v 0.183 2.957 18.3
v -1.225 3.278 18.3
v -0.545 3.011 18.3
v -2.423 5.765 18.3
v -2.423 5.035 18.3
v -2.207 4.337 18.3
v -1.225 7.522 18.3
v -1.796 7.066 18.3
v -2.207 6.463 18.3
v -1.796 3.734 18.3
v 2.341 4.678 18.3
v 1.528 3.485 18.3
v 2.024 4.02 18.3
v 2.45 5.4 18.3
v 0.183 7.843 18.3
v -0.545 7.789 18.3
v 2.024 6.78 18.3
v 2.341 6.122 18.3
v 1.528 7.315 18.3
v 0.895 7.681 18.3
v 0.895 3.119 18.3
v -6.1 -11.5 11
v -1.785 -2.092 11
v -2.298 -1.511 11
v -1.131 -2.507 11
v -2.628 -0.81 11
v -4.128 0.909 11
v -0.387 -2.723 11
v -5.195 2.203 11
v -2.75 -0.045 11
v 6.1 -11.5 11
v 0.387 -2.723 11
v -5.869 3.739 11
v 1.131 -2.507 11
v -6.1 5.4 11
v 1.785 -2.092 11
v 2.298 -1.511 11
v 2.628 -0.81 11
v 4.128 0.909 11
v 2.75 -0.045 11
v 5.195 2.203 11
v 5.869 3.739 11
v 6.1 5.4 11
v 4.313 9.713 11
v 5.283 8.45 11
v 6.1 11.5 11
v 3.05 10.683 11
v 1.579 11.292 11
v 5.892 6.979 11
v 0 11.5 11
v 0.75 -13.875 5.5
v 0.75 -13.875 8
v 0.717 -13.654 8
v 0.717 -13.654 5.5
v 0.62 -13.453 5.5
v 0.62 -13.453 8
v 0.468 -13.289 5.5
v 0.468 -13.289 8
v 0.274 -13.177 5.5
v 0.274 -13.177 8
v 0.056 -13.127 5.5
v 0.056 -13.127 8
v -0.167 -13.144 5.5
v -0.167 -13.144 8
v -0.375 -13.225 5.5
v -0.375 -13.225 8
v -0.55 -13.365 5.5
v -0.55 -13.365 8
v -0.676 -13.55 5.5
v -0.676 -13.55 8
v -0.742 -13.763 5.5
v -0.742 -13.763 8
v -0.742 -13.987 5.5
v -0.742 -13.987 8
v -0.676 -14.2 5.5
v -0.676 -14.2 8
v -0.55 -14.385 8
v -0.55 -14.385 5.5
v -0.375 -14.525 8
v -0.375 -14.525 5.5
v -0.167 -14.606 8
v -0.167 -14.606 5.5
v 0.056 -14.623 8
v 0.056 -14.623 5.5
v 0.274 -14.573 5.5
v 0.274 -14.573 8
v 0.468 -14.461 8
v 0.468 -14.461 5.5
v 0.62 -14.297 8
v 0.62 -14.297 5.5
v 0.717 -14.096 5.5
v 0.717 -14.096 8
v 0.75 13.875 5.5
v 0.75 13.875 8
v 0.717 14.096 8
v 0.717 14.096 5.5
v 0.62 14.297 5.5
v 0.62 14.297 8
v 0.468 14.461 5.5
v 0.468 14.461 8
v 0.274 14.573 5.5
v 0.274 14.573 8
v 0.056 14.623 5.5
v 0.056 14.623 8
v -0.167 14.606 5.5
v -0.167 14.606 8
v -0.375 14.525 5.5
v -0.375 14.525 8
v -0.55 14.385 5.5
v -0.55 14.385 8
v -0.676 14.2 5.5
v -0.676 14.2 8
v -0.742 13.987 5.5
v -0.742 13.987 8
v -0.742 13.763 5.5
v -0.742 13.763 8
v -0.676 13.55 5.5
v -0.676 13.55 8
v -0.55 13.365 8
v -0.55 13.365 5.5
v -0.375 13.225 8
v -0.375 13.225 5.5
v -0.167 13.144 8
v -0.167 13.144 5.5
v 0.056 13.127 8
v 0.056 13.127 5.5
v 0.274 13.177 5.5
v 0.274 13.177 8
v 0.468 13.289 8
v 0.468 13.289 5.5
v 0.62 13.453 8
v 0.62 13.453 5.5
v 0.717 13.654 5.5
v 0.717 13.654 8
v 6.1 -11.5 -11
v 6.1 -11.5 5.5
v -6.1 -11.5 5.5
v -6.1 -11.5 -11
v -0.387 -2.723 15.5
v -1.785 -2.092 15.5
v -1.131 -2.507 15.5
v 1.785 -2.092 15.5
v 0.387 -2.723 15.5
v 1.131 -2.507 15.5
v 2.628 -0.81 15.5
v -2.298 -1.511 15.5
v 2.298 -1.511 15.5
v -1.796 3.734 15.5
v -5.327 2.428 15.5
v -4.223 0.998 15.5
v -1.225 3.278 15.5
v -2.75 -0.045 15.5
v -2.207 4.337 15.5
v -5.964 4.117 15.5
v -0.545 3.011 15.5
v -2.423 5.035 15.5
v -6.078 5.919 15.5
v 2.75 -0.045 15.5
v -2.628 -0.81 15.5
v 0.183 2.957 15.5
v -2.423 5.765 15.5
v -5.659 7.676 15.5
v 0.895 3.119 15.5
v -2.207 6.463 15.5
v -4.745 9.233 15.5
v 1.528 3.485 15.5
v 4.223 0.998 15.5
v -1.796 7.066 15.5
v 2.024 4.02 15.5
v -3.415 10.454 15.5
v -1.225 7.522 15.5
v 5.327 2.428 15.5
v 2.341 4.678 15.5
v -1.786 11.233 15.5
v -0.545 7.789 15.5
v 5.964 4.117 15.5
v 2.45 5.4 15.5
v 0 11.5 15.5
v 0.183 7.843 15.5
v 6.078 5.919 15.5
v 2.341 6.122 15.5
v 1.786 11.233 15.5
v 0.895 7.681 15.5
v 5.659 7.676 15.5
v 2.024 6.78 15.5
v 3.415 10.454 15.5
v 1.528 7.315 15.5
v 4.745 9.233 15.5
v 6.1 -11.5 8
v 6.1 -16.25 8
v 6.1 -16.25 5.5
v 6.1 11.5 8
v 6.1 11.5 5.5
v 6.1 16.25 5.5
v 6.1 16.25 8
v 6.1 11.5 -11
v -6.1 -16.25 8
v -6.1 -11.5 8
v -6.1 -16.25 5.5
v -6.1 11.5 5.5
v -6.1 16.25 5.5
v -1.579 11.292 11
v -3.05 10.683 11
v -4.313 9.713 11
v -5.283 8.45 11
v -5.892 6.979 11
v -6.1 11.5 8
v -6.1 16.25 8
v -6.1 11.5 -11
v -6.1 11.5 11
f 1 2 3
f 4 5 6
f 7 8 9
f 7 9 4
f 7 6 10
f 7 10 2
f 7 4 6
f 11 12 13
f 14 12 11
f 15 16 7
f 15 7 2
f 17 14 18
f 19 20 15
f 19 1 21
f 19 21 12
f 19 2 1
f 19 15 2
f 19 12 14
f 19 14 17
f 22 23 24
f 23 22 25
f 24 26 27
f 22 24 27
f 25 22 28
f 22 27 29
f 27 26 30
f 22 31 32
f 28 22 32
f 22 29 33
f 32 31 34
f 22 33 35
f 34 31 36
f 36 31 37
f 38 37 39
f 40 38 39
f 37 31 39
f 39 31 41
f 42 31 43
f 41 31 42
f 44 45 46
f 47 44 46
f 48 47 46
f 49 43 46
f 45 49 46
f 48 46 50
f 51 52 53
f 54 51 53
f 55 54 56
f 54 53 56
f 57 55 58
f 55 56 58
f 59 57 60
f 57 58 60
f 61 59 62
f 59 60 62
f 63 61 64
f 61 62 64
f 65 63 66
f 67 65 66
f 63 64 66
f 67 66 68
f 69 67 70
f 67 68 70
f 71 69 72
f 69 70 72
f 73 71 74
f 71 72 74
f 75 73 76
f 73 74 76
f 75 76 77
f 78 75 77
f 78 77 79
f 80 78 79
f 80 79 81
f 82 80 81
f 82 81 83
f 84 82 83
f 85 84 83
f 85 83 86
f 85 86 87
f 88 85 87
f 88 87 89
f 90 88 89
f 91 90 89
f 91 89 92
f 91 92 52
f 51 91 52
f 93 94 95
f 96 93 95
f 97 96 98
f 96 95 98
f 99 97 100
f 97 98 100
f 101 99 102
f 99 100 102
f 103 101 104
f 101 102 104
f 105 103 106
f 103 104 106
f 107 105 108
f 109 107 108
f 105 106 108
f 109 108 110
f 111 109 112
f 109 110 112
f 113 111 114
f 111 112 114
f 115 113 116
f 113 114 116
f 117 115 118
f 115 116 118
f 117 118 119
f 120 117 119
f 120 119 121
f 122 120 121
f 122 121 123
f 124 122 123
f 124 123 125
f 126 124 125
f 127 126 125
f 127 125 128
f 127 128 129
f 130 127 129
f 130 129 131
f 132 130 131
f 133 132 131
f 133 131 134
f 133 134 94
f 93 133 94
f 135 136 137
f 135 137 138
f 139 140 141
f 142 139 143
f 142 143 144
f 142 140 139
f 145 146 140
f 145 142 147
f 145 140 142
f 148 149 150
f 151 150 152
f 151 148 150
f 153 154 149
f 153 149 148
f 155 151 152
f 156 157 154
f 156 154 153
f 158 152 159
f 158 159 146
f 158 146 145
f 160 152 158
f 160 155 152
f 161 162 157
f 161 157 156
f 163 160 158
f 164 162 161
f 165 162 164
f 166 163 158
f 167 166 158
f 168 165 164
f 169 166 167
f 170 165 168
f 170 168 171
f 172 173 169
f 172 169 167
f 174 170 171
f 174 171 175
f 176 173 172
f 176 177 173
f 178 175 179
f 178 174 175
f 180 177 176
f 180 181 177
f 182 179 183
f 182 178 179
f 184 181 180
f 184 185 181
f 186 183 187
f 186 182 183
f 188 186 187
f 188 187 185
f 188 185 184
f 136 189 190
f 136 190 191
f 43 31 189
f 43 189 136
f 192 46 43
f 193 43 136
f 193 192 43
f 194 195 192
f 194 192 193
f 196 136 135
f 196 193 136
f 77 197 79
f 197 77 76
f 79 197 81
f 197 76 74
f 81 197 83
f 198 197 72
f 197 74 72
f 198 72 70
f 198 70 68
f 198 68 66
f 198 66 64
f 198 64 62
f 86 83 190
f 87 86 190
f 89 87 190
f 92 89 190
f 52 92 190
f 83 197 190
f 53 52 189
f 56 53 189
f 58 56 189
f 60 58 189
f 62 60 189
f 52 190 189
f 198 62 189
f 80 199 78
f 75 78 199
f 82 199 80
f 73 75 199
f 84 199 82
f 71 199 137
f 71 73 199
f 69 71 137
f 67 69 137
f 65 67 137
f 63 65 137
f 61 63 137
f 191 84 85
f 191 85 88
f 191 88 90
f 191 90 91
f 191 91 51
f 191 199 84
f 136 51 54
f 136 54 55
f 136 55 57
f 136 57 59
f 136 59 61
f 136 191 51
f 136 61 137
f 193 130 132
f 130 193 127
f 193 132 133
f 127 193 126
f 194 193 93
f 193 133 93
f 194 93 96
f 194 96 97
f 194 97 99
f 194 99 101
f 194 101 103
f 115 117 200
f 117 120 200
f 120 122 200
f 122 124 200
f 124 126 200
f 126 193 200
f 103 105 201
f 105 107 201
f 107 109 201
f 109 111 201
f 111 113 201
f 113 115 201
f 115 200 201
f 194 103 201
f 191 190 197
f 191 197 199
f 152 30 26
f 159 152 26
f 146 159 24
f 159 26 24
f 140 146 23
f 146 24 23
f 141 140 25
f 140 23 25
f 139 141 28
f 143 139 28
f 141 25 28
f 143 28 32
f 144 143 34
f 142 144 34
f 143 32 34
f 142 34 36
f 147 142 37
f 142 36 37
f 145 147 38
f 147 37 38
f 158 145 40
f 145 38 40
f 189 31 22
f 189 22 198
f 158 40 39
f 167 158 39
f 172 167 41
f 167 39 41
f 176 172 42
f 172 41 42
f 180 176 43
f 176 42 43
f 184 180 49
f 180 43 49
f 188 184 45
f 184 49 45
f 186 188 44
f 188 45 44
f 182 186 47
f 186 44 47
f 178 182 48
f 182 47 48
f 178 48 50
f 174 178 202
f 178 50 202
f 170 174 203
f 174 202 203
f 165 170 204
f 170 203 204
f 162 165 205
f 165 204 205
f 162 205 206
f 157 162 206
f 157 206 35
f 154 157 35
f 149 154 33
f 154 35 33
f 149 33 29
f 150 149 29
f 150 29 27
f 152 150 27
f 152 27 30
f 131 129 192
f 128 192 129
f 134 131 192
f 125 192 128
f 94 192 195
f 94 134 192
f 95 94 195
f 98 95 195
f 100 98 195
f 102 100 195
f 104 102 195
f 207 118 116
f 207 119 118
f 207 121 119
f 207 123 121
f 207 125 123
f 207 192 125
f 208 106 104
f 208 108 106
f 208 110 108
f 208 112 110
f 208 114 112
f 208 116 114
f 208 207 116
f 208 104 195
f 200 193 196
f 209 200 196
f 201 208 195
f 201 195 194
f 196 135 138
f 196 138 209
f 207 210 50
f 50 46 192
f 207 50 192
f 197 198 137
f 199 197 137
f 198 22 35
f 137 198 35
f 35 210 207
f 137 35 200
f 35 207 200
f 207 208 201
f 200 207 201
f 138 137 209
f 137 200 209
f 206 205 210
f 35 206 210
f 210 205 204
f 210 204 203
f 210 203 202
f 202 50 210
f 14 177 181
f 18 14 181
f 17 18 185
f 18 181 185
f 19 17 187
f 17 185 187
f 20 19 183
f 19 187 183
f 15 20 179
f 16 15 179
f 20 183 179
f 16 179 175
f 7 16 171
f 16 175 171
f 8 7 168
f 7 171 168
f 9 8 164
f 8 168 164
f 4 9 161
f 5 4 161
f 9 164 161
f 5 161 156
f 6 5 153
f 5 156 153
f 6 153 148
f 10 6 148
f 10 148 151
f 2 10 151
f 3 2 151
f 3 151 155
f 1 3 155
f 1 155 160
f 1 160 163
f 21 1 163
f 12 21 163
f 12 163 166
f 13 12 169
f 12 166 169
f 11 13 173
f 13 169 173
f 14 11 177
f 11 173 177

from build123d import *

# Parameters (mm, degrees)
ESQUISSE1_W             = 22
ESQUISSE1_H             = 23
BOSS_EXTRU_1_DEPTH      = 6.1
BOSS_EXTRU_2_DEPTH      = 4.5
ESQUISSE3_R             = 2.45
BOSS_EXTRU_3_DEPTH      = 2.8
ESQUISSE4_W             = 2.5
ESQUISSE4_H             = 4.75
BOSS_EXTRU_4_DEPTH      = 6.1
ENL_V_MAT_EXTRU_1_REACH = 21
ESQUISSE5_R             = 0.75


with BuildPart() as part:
    # Esquisse1 → Boss.-Extru.1 (new body, symmetric)
    with BuildSketch(Plane(origin=(0, 0, 0), x_dir=(0, 0, -1), z_dir=(1, 0, 0))):
        Rectangle(ESQUISSE1_W, ESQUISSE1_H)
    extrude(amount=BOSS_EXTRU_1_DEPTH, both=True)

    # Esquisse2 → Boss.-Extru.2 (add)
    with BuildSketch(Plane.XY.offset(11)):
        with BuildLine():
            ThreePointArc((2.749629517, -0.045138889), (0, 11.5), (-2.749629517, -0.045138889))
            ThreePointArc((-2.749629517, -0.045138889), (0, -2.75), (2.749629517, -0.045138889))
        make_face()
    extrude(amount=BOSS_EXTRU_2_DEPTH)

    # Esquisse3 → Boss.-Extru.3 (add)
    with BuildSketch(Plane.XY.offset(15.5)):
        with Locations((0, 5.4)):
            Circle(ESQUISSE3_R)
    extrude(amount=BOSS_EXTRU_3_DEPTH)

    # Esquisse4 → Boss.-Extru.4 (add, symmetric)
    with BuildSketch(Plane(origin=(0, 0, 0), x_dir=(0, 0, -1), z_dir=(1, 0, 0))):
        with Locations((-6.75, 13.875)):
            Rectangle(ESQUISSE4_W, ESQUISSE4_H)
        with Locations((-6.75, -13.875)):
            Rectangle(ESQUISSE4_W, ESQUISSE4_H)
    extrude(amount=BOSS_EXTRU_4_DEPTH, both=True)

    # Esquisse5 → Enlèv. mat.-Extru.1 (cut, up to next)
    with BuildSketch(Plane.XY.offset(8), mode=Mode.PRIVATE) as enl_v_mat_extru_1_sk1:
        with Locations((0, 13.875)):
            Circle(ESQUISSE5_R)
    enl_v_mat_extru_1_tool1 = extrude(enl_v_mat_extru_1_sk1.sketch, amount=-ENL_V_MAT_EXTRU_1_REACH, mode=Mode.PRIVATE) & part.part
    add(enl_v_mat_extru_1_tool1.solids().sort_by_distance((0, 13.875, 8))[0], mode=Mode.SUBTRACT)
    # Esquisse5 → Enlèv. mat.-Extru.1 (cut, up to next)
    with BuildSketch(Plane.XY.offset(8), mode=Mode.PRIVATE) as enl_v_mat_extru_1_sk2:
        with Locations((0, -13.875)):
            Circle(ESQUISSE5_R)
    enl_v_mat_extru_1_tool2 = extrude(enl_v_mat_extru_1_sk2.sketch, amount=-ENL_V_MAT_EXTRU_1_REACH, mode=Mode.PRIVATE) & part.part
    add(enl_v_mat_extru_1_tool2.solids().sort_by_distance((0, -13.875, 8))[0], mode=Mode.SUBTRACT)


solid = part.part
